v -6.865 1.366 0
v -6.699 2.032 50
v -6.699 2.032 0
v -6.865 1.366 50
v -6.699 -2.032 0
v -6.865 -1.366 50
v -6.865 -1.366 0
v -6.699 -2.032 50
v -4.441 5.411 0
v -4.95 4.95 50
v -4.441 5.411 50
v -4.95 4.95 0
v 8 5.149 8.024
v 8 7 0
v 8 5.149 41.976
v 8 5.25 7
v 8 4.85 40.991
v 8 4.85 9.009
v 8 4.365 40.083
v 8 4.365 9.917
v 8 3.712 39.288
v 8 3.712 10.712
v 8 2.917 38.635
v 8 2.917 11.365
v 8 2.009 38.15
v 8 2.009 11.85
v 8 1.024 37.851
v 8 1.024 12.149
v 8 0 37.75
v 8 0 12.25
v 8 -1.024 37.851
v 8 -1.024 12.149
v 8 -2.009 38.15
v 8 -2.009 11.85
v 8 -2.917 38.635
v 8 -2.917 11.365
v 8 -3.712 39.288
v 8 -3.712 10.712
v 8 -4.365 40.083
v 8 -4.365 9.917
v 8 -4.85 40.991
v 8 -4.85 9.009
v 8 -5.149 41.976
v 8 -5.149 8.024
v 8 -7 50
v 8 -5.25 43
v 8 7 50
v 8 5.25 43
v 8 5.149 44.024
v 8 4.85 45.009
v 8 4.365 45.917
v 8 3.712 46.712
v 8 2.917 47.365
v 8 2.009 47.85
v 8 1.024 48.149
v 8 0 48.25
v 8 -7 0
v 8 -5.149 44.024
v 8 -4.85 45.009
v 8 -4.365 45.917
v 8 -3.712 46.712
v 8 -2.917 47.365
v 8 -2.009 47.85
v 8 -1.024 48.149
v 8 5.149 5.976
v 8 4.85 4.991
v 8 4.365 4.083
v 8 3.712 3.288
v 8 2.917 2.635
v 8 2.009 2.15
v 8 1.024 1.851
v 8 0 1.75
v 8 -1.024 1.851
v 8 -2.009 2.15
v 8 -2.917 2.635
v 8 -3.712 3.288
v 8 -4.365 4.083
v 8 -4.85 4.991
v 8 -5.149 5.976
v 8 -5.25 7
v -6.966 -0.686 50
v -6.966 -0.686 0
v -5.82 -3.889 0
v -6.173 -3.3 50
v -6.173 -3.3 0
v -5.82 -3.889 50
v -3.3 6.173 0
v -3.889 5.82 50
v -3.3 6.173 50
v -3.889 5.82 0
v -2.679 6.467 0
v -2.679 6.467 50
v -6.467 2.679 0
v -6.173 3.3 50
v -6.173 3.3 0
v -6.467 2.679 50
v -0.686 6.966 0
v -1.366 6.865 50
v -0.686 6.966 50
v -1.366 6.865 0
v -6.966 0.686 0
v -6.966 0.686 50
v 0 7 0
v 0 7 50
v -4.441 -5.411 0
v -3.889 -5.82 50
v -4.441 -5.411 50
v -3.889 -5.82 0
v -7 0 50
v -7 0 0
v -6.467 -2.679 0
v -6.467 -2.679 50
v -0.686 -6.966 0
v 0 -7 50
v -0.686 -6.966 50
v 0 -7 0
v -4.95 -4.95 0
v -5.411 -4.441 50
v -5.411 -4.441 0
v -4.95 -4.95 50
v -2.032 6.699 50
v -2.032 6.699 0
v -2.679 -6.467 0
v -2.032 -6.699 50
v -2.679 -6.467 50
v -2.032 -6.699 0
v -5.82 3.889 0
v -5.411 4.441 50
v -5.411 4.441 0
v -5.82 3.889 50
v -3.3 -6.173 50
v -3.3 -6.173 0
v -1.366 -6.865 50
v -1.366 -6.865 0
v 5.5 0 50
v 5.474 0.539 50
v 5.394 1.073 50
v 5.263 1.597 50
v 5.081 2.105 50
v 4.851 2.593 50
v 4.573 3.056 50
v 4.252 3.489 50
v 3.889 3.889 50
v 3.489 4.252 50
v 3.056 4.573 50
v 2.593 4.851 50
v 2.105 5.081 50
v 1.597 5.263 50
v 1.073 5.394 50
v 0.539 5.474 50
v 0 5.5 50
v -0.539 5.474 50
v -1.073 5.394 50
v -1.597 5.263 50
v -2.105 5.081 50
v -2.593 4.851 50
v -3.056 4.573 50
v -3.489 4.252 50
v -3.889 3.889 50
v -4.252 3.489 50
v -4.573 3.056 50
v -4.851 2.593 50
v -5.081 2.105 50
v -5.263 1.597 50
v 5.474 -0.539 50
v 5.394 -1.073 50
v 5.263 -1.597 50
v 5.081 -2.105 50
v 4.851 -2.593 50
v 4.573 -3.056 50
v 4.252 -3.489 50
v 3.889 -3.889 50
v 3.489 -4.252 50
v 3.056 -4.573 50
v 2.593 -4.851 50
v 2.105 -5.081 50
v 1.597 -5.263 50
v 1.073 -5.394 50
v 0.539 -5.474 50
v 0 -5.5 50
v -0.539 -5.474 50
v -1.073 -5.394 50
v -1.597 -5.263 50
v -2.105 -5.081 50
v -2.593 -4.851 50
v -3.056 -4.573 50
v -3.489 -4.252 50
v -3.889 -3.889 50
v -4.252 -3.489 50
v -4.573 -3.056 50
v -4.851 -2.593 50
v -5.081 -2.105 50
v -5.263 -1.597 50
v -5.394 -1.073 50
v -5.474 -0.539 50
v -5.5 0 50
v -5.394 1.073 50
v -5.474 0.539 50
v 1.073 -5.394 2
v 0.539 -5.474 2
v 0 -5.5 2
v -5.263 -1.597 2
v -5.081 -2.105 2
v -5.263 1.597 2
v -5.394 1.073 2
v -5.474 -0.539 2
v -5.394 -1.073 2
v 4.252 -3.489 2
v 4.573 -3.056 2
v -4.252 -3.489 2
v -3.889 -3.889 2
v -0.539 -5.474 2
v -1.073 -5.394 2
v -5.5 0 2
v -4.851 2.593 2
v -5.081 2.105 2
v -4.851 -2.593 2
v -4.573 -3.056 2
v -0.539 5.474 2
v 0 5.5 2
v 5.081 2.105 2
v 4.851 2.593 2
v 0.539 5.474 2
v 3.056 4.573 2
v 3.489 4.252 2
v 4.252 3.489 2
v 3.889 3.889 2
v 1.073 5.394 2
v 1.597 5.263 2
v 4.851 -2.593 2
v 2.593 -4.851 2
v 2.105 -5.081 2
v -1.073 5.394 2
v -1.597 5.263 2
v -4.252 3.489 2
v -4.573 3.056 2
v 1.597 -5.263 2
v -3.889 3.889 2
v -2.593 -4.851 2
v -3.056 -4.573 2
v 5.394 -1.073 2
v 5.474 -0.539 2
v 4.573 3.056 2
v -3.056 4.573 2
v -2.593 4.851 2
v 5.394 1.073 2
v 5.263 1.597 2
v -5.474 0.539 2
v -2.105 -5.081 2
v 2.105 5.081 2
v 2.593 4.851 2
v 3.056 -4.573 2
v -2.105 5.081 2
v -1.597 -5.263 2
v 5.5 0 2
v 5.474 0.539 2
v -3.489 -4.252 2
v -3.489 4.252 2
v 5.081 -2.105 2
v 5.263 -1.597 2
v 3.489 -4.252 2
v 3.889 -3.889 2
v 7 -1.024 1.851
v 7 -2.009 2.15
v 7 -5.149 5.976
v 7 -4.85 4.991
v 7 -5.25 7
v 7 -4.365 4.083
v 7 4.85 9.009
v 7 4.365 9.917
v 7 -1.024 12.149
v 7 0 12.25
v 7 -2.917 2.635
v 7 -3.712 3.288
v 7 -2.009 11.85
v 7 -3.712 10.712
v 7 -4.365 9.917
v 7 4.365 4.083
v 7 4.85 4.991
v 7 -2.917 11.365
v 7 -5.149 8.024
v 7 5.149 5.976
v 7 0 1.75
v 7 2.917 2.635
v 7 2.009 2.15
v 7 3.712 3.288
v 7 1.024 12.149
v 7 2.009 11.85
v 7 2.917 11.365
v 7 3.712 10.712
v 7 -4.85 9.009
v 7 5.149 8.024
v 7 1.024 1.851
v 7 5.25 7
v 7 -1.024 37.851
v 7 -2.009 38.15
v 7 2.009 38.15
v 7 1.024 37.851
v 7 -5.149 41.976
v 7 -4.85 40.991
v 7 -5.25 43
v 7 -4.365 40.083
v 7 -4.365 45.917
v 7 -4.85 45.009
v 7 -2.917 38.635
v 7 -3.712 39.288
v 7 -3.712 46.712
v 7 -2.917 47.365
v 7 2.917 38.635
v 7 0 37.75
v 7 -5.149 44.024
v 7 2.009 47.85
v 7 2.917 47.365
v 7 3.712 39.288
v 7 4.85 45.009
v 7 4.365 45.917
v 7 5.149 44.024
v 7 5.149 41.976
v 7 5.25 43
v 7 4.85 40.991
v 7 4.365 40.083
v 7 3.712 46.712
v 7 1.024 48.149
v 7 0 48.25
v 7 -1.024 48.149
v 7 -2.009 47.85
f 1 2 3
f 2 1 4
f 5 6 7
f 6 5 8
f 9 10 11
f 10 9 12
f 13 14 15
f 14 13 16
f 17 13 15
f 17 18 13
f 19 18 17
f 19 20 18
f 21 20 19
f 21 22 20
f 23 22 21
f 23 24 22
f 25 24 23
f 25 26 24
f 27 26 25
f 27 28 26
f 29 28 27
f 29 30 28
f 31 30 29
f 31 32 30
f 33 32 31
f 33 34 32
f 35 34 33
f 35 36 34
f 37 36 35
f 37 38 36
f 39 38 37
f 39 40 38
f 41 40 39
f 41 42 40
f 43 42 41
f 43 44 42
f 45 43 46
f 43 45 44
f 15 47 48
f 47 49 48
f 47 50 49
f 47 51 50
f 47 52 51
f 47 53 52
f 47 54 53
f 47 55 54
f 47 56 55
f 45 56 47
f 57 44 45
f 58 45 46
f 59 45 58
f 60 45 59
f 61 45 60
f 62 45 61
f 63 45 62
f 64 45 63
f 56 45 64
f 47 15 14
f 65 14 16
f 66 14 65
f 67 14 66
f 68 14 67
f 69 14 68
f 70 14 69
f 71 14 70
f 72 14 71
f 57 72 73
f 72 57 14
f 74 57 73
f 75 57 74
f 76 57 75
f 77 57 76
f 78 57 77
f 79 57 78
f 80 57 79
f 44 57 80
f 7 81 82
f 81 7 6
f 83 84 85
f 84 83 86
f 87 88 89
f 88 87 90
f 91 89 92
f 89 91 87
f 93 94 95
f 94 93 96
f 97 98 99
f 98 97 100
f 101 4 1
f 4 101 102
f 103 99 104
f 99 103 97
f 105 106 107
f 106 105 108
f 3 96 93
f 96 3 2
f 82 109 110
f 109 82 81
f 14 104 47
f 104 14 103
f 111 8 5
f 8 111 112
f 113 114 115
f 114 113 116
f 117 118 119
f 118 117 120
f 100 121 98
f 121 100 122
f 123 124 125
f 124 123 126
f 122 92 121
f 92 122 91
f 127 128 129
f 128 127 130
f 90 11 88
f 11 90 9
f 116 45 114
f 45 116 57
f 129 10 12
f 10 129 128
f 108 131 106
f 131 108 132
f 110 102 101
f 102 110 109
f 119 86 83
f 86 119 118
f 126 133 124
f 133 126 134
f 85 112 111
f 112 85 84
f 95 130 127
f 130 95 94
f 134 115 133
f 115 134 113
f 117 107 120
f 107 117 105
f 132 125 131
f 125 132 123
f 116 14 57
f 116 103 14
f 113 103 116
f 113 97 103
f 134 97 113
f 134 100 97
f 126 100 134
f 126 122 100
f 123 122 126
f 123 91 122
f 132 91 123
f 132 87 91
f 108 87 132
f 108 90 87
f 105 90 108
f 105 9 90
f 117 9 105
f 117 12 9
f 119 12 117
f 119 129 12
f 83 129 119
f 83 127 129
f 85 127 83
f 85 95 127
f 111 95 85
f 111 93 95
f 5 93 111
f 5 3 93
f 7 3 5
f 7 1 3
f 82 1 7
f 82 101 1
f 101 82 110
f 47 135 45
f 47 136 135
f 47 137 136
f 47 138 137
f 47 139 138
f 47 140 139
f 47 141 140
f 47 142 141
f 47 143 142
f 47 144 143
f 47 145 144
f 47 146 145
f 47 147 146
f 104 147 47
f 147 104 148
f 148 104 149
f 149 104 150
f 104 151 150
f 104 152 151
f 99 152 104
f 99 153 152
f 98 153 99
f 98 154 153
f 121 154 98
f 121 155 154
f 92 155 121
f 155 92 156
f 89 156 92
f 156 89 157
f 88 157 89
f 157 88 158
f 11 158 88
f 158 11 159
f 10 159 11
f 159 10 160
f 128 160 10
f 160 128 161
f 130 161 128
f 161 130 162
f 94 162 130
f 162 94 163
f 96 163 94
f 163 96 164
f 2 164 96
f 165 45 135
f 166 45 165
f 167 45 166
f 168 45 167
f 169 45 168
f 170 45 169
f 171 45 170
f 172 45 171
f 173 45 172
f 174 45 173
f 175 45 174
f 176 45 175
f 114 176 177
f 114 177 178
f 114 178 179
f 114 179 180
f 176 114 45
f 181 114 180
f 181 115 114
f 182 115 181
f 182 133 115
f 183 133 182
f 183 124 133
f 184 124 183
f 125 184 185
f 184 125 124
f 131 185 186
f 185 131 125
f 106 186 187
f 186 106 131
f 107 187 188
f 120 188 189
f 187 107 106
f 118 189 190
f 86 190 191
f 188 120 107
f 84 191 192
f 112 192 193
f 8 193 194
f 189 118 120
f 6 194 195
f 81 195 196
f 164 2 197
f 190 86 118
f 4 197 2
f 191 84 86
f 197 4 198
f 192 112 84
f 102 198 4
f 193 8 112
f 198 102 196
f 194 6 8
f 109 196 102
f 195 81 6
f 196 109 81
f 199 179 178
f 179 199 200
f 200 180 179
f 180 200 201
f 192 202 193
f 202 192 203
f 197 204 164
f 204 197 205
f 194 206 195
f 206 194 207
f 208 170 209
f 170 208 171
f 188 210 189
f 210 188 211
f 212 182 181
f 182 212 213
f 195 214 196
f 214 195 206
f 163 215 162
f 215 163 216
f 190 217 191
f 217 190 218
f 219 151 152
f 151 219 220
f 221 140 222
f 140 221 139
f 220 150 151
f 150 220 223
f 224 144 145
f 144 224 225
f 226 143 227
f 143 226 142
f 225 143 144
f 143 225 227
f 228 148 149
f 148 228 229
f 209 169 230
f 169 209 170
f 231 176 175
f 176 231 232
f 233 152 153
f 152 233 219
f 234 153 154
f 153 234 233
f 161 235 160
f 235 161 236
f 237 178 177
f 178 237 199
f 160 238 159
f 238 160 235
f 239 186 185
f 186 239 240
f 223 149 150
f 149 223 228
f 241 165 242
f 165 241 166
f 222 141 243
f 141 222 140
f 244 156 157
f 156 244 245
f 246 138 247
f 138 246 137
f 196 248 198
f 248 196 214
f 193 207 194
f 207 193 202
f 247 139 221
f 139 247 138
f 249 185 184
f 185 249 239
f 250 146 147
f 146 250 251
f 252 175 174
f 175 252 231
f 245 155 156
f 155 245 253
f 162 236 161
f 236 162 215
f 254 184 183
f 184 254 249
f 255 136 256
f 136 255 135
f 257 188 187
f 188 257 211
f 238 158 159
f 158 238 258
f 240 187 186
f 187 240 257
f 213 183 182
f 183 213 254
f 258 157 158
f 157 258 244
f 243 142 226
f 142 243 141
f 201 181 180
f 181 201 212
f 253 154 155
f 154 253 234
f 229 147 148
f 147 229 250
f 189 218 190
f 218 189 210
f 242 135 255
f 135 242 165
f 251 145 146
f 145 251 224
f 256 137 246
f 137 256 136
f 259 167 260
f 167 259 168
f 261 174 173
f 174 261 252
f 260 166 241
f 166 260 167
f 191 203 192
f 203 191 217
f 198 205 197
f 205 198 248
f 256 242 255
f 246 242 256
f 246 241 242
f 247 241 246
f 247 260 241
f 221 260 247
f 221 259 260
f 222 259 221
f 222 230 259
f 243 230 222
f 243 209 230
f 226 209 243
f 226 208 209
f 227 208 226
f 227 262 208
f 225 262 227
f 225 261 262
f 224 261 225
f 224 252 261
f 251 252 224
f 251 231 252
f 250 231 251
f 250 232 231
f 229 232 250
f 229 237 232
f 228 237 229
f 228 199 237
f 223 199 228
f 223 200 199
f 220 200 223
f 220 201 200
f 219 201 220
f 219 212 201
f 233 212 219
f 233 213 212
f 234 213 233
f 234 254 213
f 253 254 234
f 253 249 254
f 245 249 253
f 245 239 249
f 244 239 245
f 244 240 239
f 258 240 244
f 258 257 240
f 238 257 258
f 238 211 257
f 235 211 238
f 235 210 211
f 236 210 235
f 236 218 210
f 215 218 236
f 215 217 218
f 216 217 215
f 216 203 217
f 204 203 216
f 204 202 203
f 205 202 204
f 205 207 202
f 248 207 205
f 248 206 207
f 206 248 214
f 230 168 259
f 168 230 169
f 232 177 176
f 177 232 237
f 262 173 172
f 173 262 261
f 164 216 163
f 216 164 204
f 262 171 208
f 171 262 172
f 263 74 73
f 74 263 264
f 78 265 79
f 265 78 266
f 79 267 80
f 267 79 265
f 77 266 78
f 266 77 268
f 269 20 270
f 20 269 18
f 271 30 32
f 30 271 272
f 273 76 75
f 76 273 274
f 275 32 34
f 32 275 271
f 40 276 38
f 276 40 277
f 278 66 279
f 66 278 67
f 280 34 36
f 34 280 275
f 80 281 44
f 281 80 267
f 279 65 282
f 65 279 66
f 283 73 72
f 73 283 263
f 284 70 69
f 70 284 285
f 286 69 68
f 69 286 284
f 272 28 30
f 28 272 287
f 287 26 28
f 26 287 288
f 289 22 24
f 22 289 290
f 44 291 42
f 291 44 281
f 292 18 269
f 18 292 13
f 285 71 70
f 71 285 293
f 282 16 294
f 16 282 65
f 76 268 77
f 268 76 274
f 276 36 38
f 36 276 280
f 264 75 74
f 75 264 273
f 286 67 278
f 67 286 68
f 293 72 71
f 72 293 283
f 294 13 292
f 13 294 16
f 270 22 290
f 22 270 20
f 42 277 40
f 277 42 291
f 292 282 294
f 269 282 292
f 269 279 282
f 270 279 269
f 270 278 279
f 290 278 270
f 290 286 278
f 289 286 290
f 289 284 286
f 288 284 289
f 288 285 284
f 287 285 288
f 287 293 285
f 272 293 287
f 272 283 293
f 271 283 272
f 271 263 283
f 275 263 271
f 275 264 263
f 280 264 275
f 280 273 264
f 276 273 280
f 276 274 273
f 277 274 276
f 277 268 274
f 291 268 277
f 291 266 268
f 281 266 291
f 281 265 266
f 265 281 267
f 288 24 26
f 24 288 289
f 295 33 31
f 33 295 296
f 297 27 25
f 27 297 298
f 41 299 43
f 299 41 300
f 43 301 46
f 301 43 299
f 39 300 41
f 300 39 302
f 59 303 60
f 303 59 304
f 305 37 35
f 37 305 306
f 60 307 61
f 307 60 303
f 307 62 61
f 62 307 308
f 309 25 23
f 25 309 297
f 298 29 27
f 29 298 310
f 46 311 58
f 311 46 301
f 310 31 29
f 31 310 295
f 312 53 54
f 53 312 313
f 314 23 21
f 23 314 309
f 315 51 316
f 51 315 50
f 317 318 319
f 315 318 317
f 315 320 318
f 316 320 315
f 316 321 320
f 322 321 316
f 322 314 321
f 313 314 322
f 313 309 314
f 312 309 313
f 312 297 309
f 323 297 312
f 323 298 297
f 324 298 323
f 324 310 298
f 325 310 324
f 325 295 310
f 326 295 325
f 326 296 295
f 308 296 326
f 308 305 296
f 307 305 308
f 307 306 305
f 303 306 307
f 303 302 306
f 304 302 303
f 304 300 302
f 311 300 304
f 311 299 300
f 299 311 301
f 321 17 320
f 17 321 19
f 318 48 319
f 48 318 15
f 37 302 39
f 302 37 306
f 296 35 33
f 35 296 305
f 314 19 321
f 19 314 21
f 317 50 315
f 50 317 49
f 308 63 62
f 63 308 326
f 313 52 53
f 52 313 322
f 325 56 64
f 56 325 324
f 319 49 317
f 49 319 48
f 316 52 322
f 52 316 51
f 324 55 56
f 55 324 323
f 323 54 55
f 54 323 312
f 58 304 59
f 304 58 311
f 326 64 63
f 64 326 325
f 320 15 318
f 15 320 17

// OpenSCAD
//All units in mm.

//Total height of the holder.
total_height=50; //[0:100]

//Diameter of the pen. 
pen_diameter=10; //[5:50]

//Diameter of the magnets. Must not be larger than the pen diameter!
magnet_diameter=10; //[1:20]

//Height of the magnets. This also changes the thickness of the back wall.
magnet_height=1; //[1:20]

//Calculate outer wall (2mm)
outer_diameter=pen_diameter+4;

rotate([0,0,-90])
difference()
{
difference()
{
linear_extrude(height=total_height,convexity=10)
union()
{
circle(r=(outer_diameter/2), $fn=64);
translate([-(outer_diameter/2),0,0])
square([outer_diameter,magnet_height+(outer_diameter/2)]);
}


translate([0,0,2])
linear_extrude(height=total_height,convexity=10)
circle(r=(pen_diameter/2)+0.5, $fn=64);
}

translate([0,outer_diameter/2,(magnet_diameter/2)+2])
rotate([-90,0,0])
cylinder(h=magnet_height+1,r=(magnet_diameter/2)+0.25,$fn=32);

translate([0,outer_diameter/2,total_height-((magnet_diameter/2)+2)])
rotate([-90,0,0])
cylinder(h=magnet_height+1,r=(magnet_diameter/2)+0.25, $fn=32);

}
